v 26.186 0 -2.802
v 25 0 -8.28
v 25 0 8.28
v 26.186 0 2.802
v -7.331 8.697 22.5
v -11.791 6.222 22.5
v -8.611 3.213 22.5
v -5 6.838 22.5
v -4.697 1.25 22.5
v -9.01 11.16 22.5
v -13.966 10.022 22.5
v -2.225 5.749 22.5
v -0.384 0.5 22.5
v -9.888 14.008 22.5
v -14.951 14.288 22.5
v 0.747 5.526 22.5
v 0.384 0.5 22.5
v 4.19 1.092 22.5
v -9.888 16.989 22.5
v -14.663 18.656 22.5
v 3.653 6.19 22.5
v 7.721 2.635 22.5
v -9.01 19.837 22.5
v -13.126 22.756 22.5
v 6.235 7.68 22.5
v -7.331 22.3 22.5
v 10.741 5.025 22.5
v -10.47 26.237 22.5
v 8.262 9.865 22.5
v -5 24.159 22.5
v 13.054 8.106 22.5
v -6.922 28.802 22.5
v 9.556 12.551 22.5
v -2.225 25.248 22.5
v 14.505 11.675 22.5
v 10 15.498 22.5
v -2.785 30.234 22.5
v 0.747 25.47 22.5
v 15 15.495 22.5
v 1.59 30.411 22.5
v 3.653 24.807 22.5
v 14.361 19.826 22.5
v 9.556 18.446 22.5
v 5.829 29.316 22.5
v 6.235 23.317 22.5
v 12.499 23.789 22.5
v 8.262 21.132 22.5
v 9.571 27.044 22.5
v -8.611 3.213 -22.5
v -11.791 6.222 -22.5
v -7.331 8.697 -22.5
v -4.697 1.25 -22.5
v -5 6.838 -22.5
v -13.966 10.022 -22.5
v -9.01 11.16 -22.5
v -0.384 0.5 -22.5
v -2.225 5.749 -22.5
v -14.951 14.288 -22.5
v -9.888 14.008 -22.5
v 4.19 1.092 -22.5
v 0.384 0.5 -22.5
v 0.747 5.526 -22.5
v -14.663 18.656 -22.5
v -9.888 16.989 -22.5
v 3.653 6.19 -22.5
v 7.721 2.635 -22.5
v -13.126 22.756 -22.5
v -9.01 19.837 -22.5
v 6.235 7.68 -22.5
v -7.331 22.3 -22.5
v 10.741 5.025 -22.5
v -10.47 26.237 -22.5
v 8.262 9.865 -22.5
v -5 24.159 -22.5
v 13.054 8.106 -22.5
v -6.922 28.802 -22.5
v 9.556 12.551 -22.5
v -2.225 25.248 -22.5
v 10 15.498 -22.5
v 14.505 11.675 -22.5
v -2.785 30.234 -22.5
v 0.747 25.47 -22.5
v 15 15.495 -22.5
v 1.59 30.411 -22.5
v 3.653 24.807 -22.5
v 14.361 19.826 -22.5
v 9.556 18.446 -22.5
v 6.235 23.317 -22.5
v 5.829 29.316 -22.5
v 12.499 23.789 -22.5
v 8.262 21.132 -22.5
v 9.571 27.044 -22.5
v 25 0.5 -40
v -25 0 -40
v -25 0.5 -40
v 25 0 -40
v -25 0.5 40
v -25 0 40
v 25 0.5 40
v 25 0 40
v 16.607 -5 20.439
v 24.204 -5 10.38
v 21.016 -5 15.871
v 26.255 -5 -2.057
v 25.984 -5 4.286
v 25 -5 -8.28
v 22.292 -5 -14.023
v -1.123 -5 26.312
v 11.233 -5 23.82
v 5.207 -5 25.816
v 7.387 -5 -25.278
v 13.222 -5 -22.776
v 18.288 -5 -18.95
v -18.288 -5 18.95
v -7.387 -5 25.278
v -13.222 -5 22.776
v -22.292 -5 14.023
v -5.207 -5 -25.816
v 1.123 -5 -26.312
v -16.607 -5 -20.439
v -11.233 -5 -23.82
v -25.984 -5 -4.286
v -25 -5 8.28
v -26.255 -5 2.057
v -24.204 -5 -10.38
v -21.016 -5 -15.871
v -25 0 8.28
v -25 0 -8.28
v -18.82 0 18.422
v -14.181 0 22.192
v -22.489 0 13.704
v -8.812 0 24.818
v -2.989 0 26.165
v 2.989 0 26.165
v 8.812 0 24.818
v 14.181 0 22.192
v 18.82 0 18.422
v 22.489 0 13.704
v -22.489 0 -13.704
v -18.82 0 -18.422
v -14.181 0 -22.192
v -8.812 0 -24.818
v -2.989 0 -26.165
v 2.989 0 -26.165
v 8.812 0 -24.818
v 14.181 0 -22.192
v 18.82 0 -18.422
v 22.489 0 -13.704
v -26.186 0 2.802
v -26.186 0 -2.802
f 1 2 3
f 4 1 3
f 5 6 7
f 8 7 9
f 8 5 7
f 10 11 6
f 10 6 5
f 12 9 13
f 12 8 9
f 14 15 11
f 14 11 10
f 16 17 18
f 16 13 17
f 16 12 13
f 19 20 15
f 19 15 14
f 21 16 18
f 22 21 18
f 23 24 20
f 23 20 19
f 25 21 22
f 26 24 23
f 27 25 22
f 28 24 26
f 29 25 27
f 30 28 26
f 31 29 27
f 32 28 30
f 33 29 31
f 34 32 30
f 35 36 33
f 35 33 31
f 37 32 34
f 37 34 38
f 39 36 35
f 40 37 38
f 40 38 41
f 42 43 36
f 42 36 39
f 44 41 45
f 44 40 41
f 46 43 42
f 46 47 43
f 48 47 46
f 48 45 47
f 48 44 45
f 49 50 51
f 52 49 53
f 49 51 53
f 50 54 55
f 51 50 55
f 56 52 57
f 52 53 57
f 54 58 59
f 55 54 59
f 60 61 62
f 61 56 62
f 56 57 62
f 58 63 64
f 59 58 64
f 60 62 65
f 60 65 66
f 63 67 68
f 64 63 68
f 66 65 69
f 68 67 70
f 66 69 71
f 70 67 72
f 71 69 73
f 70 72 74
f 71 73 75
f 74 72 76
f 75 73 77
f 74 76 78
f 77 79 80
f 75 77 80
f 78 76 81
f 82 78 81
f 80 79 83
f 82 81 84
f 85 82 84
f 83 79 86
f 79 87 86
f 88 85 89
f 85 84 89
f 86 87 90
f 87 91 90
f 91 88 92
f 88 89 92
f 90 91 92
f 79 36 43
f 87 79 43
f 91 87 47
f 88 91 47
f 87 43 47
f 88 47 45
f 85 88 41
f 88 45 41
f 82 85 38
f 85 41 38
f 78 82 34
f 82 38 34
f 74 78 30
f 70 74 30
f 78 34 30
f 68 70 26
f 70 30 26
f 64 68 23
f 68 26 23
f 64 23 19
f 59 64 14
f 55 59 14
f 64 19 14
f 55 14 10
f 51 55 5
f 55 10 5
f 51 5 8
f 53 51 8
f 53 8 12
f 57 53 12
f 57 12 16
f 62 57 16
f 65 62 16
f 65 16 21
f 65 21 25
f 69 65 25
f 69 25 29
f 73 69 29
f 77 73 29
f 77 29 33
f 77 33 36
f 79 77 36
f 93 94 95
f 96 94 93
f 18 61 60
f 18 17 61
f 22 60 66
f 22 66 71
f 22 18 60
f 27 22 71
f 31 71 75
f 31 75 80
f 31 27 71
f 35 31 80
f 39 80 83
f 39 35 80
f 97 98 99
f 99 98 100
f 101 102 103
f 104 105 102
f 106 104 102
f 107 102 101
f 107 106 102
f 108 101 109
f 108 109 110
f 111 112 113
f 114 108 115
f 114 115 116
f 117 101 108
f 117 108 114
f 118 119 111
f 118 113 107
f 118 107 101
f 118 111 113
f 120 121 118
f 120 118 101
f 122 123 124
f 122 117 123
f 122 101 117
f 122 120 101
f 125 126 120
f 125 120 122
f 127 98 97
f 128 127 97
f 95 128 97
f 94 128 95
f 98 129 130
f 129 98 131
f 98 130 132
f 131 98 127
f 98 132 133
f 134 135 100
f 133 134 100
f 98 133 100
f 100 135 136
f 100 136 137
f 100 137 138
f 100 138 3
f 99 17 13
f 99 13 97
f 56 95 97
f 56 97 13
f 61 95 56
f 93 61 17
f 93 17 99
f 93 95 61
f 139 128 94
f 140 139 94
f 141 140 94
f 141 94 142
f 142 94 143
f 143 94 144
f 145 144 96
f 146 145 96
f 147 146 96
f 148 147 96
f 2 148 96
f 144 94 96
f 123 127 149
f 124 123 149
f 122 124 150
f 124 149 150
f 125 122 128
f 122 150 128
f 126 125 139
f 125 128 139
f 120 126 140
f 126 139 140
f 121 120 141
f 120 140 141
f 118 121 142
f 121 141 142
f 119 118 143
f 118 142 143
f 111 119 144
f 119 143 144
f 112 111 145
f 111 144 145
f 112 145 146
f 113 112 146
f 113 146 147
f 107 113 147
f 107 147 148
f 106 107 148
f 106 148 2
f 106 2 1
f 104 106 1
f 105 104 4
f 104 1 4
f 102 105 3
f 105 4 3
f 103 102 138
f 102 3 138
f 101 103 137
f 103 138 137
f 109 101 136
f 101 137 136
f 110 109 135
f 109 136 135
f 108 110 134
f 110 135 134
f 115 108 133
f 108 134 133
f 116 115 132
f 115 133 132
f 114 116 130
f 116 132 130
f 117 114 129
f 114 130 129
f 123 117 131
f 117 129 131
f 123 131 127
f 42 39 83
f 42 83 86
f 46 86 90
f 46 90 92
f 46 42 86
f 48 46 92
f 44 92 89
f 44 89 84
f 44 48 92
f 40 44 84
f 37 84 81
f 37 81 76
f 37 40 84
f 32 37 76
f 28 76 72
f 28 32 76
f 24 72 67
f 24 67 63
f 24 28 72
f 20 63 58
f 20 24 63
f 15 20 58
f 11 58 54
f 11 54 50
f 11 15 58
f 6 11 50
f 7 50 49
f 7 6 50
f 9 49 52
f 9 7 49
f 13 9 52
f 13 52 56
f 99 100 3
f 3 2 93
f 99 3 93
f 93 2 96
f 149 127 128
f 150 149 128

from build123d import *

# Parameters (mm, degrees)
SKETCH1_W           = 50
SKETCH1_H           = 80
BOSS_EXTRUDE1_DEPTH = 0.5
SKETCH4_R           = 26.335590494
BOSS_EXTRUDE2_DEPTH = 5
SKETCH5_R           = 15
BOSS_EXTRUDE3_DEPTH = 22.5
SKETCH7_R           = 10
CUT_EXTRUDE2_DEPTH  = 75.3623798


with BuildPart() as part:
    # Sketch1 → Boss-Extrude1 (new body)
    with BuildSketch(Plane(origin=(0, 0, 0), x_dir=(1, 0, 0), z_dir=(0, 1, 0))):
        Rectangle(SKETCH1_W, SKETCH1_H)
    extrude(amount=BOSS_EXTRUDE1_DEPTH)

    # Sketch4 → Boss-Extrude2 (add)
    with BuildSketch(Plane.XZ):
        with Locations(Location((0, 0, 0), (0, 0, 161.674514968))):
            Circle(SKETCH4_R)
    extrude(amount=BOSS_EXTRUDE2_DEPTH)

    # Sketch5 → Boss-Extrude3 (add, symmetric)
    with BuildSketch(Plane.XY):
        with Locations((0, 15.495084895)):
            Circle(SKETCH5_R)
    extrude(amount=BOSS_EXTRUDE3_DEPTH, both=True)

    # Sketch7 → Cut-Extrude2 (cut, through all)
    with BuildSketch(Plane.XY.offset(22.5)):
        with Locations((0, 15.498342616)):
            Circle(SKETCH7_R)
    extrude(amount=-CUT_EXTRUDE2_DEPTH, mode=Mode.SUBTRACT)


solid = part.part
